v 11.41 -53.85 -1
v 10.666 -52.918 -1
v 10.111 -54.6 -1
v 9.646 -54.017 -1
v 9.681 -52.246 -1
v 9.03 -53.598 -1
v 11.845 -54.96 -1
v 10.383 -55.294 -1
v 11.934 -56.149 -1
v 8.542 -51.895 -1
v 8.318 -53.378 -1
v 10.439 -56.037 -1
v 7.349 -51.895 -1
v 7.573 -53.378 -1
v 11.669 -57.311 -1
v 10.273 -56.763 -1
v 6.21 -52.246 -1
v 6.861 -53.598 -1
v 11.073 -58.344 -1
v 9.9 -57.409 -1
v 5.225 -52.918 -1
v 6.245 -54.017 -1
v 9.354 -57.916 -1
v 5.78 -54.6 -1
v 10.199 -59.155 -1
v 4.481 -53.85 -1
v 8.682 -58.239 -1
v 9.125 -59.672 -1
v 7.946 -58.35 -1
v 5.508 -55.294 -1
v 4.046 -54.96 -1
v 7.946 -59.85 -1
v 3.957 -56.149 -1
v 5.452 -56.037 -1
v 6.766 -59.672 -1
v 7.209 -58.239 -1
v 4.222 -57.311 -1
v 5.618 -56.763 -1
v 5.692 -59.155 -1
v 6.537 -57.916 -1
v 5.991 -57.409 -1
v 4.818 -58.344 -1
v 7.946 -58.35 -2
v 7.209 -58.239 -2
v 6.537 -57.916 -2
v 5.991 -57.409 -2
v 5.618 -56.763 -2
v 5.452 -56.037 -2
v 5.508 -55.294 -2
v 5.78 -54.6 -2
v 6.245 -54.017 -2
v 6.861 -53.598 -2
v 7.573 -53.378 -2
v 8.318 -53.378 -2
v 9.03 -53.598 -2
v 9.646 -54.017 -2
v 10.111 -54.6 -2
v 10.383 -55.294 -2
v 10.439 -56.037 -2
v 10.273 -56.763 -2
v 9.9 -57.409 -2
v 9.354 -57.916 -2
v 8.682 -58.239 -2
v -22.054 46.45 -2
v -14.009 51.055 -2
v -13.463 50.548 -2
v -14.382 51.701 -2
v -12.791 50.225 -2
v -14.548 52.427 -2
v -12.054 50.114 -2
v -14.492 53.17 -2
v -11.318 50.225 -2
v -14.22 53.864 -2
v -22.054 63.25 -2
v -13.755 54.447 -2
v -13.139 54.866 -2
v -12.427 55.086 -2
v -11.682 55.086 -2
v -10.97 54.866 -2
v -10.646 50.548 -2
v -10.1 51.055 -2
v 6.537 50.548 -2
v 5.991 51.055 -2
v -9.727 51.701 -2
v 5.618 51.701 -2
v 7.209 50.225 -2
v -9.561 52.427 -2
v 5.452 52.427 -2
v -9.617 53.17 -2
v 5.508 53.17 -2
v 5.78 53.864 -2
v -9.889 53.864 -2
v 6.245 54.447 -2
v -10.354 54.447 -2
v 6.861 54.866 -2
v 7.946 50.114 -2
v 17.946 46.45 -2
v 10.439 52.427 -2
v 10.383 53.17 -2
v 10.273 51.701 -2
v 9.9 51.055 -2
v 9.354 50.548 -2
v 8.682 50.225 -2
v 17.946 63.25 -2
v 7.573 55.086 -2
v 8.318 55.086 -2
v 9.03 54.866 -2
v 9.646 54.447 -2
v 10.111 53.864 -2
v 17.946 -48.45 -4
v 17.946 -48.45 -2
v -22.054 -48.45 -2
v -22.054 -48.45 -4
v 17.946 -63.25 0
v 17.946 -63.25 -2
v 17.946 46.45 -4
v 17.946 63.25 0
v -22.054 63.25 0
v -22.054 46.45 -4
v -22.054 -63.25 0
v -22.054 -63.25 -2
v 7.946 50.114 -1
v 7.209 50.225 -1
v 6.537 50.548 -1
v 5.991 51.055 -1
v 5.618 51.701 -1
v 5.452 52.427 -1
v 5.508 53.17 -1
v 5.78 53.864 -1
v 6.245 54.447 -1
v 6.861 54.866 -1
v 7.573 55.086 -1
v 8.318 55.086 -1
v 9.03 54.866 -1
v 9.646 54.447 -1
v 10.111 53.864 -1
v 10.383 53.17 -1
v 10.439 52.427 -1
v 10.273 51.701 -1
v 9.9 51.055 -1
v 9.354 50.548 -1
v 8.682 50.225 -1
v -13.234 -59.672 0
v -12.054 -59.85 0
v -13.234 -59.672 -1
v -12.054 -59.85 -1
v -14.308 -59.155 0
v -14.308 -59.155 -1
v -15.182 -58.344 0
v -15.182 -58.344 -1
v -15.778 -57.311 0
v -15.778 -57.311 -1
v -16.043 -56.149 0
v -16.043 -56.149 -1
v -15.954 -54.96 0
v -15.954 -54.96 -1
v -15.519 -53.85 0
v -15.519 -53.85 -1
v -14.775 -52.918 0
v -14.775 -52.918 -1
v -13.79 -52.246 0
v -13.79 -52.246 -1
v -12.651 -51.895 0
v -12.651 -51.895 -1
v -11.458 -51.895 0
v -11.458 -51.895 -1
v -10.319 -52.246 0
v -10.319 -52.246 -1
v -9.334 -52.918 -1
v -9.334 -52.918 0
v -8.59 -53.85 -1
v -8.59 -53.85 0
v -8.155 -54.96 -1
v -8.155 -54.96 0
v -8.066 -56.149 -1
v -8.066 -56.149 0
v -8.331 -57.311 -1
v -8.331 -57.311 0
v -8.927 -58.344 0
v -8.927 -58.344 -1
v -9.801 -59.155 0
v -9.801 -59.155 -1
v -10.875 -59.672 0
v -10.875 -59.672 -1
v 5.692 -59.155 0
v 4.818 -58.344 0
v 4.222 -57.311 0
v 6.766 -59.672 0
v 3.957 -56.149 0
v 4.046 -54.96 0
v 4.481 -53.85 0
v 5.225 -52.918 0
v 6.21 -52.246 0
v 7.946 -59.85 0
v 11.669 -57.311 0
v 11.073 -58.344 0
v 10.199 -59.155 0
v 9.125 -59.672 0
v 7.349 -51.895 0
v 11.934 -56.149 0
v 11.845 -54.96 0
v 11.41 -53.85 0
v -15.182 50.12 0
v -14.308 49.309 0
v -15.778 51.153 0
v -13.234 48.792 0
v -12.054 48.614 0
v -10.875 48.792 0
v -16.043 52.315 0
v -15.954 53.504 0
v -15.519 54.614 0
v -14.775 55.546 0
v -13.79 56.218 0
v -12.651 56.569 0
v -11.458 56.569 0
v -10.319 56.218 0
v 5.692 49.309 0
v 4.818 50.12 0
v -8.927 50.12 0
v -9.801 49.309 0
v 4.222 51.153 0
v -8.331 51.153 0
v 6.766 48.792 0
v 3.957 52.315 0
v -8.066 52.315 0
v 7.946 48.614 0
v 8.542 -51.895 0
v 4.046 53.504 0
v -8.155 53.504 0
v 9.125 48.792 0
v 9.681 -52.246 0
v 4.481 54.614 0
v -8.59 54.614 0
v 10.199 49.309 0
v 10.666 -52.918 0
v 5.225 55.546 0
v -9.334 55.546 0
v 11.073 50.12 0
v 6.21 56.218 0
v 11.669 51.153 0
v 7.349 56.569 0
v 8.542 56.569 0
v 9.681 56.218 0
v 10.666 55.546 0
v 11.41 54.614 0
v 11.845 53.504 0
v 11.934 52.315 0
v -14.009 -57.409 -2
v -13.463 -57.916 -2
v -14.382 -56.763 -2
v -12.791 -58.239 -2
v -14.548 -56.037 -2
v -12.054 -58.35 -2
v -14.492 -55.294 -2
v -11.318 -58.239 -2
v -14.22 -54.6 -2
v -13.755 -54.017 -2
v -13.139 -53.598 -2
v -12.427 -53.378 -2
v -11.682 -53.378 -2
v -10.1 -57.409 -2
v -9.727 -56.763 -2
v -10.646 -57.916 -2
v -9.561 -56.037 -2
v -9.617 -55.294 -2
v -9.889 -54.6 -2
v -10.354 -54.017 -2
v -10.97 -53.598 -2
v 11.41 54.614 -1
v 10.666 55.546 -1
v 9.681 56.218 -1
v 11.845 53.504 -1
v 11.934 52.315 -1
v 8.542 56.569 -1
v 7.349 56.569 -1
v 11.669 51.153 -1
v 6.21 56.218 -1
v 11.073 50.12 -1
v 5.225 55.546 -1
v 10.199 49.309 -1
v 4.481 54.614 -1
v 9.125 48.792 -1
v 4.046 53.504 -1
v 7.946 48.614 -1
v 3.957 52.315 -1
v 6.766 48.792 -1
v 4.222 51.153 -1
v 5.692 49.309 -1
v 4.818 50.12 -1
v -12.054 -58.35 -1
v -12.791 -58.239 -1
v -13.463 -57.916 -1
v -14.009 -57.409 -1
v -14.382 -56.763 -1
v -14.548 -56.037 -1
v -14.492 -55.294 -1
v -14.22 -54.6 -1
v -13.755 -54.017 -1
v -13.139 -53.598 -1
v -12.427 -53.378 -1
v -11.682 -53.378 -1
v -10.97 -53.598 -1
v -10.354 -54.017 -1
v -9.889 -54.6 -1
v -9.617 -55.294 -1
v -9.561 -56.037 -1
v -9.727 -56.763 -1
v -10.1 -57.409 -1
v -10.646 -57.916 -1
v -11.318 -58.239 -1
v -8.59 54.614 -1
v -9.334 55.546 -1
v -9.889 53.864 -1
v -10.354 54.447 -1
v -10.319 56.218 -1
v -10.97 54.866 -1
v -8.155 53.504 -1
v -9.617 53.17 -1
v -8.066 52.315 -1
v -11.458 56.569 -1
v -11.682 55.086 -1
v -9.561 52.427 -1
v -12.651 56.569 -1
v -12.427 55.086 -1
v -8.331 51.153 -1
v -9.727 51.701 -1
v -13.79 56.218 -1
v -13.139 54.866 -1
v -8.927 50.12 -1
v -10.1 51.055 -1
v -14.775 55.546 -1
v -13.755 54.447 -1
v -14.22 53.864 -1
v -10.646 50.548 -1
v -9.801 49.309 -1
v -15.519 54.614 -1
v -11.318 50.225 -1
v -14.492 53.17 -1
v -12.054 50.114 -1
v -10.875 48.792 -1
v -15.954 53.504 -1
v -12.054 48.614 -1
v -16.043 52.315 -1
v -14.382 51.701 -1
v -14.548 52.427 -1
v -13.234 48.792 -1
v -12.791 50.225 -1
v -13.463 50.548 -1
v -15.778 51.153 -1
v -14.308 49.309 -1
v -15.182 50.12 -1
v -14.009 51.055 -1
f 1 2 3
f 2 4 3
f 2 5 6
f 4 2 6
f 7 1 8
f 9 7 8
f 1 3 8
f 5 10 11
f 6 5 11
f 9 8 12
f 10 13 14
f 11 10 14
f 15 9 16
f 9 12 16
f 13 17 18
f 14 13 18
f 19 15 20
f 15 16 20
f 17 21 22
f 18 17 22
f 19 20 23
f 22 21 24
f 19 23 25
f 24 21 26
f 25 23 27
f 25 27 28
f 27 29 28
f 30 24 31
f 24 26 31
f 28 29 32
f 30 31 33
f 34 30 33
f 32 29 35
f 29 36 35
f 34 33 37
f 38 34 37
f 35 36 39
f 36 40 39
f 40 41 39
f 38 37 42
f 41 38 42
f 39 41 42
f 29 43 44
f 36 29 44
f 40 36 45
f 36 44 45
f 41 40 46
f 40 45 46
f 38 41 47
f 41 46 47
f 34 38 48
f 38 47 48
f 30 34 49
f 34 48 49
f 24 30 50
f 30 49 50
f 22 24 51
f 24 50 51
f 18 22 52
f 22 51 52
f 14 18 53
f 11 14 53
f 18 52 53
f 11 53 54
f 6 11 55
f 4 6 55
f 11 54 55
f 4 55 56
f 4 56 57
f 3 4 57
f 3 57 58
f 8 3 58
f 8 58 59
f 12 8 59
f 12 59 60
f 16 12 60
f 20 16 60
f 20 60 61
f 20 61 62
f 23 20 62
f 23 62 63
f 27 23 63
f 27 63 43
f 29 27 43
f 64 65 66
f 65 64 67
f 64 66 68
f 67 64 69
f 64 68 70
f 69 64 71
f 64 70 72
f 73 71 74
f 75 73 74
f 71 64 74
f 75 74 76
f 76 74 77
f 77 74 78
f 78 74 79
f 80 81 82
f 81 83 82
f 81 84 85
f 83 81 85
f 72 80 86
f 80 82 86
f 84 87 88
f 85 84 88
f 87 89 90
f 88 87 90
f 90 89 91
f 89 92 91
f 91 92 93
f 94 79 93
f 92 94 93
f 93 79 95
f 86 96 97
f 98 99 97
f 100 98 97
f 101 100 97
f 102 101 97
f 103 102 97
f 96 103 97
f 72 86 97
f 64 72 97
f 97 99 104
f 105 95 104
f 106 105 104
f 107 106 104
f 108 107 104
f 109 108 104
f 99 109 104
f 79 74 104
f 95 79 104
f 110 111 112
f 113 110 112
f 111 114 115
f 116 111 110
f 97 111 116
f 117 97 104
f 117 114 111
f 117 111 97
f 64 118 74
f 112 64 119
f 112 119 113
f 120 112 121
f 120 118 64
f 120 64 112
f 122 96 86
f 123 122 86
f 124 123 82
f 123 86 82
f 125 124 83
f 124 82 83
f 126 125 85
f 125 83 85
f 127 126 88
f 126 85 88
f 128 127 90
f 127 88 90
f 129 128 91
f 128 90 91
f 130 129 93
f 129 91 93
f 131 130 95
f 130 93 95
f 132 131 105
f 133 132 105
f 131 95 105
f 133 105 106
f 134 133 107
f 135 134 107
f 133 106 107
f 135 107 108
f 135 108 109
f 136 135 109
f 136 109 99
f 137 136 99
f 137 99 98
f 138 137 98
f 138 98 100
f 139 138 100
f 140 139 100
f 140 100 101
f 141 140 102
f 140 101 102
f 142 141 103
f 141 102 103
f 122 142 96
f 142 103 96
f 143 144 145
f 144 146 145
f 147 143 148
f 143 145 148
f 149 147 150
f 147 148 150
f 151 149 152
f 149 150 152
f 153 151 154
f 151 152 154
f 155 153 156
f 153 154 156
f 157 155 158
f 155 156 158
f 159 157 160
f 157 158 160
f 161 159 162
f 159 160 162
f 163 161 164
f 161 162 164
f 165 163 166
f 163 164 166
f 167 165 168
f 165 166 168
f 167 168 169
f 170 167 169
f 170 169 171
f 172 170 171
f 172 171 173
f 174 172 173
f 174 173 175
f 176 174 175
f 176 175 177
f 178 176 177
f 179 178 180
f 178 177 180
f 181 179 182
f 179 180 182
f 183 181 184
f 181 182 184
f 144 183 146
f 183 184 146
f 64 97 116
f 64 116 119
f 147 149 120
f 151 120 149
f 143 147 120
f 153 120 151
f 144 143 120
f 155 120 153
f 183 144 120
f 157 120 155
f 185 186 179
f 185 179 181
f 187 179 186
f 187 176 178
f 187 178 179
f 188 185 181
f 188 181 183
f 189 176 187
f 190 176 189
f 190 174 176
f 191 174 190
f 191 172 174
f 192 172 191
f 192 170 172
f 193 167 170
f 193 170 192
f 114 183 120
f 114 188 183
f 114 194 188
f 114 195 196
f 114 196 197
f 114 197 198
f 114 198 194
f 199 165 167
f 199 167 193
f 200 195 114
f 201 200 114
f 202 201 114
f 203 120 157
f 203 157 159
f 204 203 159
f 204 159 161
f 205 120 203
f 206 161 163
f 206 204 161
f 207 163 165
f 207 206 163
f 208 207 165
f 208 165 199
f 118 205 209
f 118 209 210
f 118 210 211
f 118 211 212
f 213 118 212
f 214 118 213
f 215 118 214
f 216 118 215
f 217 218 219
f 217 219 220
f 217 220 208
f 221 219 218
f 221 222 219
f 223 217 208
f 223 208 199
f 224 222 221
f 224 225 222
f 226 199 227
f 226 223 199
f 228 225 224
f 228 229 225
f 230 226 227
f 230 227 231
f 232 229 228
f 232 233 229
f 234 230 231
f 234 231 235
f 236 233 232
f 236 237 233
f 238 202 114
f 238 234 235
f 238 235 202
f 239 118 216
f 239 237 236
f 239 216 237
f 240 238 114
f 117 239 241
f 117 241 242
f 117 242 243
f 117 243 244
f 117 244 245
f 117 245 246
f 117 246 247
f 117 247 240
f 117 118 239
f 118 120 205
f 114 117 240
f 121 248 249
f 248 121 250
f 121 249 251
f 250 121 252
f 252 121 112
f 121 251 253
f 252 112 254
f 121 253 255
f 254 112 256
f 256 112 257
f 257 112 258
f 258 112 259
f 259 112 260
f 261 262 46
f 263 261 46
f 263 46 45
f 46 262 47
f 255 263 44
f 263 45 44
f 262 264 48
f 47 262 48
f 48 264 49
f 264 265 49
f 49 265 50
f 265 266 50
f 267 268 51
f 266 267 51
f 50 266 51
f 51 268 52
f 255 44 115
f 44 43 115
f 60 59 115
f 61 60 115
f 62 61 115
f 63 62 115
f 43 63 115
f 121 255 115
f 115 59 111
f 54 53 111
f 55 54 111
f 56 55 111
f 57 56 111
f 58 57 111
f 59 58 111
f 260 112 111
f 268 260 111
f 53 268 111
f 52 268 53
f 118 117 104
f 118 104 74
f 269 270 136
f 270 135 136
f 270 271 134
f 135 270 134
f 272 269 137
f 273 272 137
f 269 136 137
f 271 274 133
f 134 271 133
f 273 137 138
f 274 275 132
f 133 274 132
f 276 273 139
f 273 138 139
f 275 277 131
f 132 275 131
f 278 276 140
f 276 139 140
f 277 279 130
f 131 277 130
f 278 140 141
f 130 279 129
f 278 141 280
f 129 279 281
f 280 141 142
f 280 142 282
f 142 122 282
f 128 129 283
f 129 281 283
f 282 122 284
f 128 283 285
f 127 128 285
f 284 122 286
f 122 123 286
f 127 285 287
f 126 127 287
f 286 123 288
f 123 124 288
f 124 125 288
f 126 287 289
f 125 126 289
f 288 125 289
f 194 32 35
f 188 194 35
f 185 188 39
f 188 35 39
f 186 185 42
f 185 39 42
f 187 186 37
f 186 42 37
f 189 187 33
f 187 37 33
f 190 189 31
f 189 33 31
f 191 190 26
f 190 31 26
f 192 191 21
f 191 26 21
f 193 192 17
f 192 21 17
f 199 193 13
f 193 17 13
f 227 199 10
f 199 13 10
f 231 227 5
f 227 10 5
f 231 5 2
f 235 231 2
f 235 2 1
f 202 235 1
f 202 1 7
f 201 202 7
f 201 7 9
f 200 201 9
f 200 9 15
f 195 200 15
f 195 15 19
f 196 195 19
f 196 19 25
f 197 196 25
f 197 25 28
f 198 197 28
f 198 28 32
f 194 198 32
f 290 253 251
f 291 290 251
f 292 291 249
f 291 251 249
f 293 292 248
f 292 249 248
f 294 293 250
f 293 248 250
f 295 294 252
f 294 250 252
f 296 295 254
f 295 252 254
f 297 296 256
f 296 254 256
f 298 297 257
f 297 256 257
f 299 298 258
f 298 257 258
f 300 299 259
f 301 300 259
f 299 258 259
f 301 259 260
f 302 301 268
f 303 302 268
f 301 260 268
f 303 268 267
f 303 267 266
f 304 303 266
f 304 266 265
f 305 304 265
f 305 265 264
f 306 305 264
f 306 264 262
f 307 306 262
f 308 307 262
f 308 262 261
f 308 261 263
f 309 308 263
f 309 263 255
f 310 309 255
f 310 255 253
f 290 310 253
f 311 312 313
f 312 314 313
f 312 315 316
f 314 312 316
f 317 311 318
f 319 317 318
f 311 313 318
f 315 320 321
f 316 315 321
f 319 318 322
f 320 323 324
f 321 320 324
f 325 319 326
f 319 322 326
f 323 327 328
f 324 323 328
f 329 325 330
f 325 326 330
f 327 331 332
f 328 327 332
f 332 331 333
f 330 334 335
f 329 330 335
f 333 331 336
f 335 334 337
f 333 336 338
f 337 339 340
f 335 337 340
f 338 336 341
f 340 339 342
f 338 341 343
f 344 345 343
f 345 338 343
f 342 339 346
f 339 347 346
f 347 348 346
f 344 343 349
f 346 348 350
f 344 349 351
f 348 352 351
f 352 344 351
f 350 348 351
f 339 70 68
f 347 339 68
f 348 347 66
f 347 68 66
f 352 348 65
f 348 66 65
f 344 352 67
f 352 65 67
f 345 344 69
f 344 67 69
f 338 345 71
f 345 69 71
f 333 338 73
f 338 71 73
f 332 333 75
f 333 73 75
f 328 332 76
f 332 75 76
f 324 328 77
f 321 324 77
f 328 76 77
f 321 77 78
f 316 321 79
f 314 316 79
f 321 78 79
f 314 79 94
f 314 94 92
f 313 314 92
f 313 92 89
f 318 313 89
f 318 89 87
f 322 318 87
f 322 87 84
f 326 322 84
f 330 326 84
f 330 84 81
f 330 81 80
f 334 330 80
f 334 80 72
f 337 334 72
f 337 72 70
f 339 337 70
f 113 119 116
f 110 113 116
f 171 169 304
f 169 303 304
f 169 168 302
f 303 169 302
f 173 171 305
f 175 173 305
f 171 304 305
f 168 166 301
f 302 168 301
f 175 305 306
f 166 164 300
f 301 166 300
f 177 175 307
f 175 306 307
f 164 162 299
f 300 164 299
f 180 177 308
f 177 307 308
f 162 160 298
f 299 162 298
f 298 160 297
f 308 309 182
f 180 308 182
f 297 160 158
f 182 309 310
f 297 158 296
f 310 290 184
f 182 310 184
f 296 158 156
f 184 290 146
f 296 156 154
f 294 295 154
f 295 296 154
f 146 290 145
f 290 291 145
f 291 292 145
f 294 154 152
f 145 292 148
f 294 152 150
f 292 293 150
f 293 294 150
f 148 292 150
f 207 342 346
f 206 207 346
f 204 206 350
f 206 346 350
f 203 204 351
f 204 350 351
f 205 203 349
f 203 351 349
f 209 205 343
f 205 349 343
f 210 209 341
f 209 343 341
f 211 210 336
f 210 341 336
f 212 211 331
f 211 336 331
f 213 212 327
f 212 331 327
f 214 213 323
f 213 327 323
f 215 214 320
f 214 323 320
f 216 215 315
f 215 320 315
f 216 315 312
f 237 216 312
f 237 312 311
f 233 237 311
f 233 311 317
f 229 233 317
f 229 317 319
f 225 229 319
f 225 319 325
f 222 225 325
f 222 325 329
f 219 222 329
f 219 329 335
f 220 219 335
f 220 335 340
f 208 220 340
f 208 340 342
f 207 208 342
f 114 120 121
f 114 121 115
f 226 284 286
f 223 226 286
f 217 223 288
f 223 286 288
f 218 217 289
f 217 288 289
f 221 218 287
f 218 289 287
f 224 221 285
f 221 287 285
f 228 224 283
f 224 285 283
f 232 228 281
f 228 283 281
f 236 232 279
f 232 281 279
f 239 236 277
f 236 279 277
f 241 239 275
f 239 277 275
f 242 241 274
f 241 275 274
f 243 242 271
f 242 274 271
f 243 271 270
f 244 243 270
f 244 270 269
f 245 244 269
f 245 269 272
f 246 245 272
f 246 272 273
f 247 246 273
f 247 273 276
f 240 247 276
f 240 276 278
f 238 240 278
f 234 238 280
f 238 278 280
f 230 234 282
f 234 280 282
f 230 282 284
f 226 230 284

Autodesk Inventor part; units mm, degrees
ref_plane "YZ Plane" through (0, 0, 0) normal (1, 0, 0) x (0, 1, 0)
ref_plane "XZ Plane" through (0, 0, 0) normal (0, 1, 0) x (-1, 0, 0)
ref_plane "XY Plane" through (0, 0, 0) normal (0, 0, 1) x (1, 0, 0)
sketch "Sketch1" plane through (0, 0, 0) normal (0, 0, 1) x (1, 0, 0)
  line L0 (-22.0545, -63.25) -> (17.9455, -63.25)
  line L1 (17.9455, -63.25) -> (17.9455, 63.25)
  line L2 (17.9455, 63.25) -> (-22.0545, 63.25)
  line L3 (-22.0545, 63.25) -> (-22.0545, -63.25)
  line L4 (-22.0545, -63.25) -> (17.9455, 63.25) construction
  line L5 (17.9455, -63.25) -> (-22.0545, 63.25) construction
  line L6 (-22.0545, -63.25) -> (17.9455, -63.25)
  line L7 (17.9455, -63.25) -> (17.9455, -48.45)
  line L8 (17.9455, -48.45) -> (-22.0545, -48.45)
  line L9 (-22.0545, -48.45) -> (-22.0545, -63.25)
  line L10 (-22.0545, -55.85) -> (17.9455, -55.85) construction
  line L11 (-2.0545, -55.85) -> (7.9455, -55.85) construction
  line L12 (-2.0545, -55.85) -> (-12.0545, -55.85) construction
  line L13 (-22.0545, 63.25) -> (17.9455, 63.25)
  line L14 (17.9455, 63.25) -> (17.9455, 46.45)
  line L15 (17.9455, 46.45) -> (-22.0545, 46.45)
  line L16 (-22.0545, 46.45) -> (-22.0545, 63.25)
  line L17 (-22.0545, 46.45) -> (-22.0545, 52.614) construction
  line L18 (-22.0545, 52.614) -> (17.9455, 52.614) construction
  line L19 (-2.0545, 52.614) -> (7.9455, 52.614) construction
  line L20 (-2.0545, 52.614) -> (-12.0545, 52.614) construction
  line L21 (-22.0545, 46.45) -> (17.9455, 46.45)
  line L22 (17.9455, 46.45) -> (17.9455, -48.45)
  line L23 (17.9455, -48.45) -> (-22.0545, -48.45)
  line L24 (-22.0545, -48.45) -> (-22.0545, 46.45)
  point P0 (0, 0)
  point P1 (-2.0545, 0)
  dimension "d0" = 40
  dimension "d1" = 126.5
  dimension "d4" = 14.8
  dimension "d5" = 10
  dimension "d6" = 10
  dimension "d9" = 16.8
  dimension "d10" = 6.164
  dimension "d11" = 10
  dimension "d12" = 10
extrude "Extrusion1" add sketch "Sketch1" against normal blind 2
extrude "Extrusion2" add sketch "Sketch1" against normal blind 4 contours L3 L15 L1 L8
hole "Hole1" at (-12.0545, 52.614, 0) at (7.9455, 52.614, 0) at (-12.0545, -55.85, 0) at (7.9455, -55.85, 0) direction (0, 0, -1) diameter 5 end through all counterbore diameter 8 counterbore depth 1
properties part number "BatteryCover"
